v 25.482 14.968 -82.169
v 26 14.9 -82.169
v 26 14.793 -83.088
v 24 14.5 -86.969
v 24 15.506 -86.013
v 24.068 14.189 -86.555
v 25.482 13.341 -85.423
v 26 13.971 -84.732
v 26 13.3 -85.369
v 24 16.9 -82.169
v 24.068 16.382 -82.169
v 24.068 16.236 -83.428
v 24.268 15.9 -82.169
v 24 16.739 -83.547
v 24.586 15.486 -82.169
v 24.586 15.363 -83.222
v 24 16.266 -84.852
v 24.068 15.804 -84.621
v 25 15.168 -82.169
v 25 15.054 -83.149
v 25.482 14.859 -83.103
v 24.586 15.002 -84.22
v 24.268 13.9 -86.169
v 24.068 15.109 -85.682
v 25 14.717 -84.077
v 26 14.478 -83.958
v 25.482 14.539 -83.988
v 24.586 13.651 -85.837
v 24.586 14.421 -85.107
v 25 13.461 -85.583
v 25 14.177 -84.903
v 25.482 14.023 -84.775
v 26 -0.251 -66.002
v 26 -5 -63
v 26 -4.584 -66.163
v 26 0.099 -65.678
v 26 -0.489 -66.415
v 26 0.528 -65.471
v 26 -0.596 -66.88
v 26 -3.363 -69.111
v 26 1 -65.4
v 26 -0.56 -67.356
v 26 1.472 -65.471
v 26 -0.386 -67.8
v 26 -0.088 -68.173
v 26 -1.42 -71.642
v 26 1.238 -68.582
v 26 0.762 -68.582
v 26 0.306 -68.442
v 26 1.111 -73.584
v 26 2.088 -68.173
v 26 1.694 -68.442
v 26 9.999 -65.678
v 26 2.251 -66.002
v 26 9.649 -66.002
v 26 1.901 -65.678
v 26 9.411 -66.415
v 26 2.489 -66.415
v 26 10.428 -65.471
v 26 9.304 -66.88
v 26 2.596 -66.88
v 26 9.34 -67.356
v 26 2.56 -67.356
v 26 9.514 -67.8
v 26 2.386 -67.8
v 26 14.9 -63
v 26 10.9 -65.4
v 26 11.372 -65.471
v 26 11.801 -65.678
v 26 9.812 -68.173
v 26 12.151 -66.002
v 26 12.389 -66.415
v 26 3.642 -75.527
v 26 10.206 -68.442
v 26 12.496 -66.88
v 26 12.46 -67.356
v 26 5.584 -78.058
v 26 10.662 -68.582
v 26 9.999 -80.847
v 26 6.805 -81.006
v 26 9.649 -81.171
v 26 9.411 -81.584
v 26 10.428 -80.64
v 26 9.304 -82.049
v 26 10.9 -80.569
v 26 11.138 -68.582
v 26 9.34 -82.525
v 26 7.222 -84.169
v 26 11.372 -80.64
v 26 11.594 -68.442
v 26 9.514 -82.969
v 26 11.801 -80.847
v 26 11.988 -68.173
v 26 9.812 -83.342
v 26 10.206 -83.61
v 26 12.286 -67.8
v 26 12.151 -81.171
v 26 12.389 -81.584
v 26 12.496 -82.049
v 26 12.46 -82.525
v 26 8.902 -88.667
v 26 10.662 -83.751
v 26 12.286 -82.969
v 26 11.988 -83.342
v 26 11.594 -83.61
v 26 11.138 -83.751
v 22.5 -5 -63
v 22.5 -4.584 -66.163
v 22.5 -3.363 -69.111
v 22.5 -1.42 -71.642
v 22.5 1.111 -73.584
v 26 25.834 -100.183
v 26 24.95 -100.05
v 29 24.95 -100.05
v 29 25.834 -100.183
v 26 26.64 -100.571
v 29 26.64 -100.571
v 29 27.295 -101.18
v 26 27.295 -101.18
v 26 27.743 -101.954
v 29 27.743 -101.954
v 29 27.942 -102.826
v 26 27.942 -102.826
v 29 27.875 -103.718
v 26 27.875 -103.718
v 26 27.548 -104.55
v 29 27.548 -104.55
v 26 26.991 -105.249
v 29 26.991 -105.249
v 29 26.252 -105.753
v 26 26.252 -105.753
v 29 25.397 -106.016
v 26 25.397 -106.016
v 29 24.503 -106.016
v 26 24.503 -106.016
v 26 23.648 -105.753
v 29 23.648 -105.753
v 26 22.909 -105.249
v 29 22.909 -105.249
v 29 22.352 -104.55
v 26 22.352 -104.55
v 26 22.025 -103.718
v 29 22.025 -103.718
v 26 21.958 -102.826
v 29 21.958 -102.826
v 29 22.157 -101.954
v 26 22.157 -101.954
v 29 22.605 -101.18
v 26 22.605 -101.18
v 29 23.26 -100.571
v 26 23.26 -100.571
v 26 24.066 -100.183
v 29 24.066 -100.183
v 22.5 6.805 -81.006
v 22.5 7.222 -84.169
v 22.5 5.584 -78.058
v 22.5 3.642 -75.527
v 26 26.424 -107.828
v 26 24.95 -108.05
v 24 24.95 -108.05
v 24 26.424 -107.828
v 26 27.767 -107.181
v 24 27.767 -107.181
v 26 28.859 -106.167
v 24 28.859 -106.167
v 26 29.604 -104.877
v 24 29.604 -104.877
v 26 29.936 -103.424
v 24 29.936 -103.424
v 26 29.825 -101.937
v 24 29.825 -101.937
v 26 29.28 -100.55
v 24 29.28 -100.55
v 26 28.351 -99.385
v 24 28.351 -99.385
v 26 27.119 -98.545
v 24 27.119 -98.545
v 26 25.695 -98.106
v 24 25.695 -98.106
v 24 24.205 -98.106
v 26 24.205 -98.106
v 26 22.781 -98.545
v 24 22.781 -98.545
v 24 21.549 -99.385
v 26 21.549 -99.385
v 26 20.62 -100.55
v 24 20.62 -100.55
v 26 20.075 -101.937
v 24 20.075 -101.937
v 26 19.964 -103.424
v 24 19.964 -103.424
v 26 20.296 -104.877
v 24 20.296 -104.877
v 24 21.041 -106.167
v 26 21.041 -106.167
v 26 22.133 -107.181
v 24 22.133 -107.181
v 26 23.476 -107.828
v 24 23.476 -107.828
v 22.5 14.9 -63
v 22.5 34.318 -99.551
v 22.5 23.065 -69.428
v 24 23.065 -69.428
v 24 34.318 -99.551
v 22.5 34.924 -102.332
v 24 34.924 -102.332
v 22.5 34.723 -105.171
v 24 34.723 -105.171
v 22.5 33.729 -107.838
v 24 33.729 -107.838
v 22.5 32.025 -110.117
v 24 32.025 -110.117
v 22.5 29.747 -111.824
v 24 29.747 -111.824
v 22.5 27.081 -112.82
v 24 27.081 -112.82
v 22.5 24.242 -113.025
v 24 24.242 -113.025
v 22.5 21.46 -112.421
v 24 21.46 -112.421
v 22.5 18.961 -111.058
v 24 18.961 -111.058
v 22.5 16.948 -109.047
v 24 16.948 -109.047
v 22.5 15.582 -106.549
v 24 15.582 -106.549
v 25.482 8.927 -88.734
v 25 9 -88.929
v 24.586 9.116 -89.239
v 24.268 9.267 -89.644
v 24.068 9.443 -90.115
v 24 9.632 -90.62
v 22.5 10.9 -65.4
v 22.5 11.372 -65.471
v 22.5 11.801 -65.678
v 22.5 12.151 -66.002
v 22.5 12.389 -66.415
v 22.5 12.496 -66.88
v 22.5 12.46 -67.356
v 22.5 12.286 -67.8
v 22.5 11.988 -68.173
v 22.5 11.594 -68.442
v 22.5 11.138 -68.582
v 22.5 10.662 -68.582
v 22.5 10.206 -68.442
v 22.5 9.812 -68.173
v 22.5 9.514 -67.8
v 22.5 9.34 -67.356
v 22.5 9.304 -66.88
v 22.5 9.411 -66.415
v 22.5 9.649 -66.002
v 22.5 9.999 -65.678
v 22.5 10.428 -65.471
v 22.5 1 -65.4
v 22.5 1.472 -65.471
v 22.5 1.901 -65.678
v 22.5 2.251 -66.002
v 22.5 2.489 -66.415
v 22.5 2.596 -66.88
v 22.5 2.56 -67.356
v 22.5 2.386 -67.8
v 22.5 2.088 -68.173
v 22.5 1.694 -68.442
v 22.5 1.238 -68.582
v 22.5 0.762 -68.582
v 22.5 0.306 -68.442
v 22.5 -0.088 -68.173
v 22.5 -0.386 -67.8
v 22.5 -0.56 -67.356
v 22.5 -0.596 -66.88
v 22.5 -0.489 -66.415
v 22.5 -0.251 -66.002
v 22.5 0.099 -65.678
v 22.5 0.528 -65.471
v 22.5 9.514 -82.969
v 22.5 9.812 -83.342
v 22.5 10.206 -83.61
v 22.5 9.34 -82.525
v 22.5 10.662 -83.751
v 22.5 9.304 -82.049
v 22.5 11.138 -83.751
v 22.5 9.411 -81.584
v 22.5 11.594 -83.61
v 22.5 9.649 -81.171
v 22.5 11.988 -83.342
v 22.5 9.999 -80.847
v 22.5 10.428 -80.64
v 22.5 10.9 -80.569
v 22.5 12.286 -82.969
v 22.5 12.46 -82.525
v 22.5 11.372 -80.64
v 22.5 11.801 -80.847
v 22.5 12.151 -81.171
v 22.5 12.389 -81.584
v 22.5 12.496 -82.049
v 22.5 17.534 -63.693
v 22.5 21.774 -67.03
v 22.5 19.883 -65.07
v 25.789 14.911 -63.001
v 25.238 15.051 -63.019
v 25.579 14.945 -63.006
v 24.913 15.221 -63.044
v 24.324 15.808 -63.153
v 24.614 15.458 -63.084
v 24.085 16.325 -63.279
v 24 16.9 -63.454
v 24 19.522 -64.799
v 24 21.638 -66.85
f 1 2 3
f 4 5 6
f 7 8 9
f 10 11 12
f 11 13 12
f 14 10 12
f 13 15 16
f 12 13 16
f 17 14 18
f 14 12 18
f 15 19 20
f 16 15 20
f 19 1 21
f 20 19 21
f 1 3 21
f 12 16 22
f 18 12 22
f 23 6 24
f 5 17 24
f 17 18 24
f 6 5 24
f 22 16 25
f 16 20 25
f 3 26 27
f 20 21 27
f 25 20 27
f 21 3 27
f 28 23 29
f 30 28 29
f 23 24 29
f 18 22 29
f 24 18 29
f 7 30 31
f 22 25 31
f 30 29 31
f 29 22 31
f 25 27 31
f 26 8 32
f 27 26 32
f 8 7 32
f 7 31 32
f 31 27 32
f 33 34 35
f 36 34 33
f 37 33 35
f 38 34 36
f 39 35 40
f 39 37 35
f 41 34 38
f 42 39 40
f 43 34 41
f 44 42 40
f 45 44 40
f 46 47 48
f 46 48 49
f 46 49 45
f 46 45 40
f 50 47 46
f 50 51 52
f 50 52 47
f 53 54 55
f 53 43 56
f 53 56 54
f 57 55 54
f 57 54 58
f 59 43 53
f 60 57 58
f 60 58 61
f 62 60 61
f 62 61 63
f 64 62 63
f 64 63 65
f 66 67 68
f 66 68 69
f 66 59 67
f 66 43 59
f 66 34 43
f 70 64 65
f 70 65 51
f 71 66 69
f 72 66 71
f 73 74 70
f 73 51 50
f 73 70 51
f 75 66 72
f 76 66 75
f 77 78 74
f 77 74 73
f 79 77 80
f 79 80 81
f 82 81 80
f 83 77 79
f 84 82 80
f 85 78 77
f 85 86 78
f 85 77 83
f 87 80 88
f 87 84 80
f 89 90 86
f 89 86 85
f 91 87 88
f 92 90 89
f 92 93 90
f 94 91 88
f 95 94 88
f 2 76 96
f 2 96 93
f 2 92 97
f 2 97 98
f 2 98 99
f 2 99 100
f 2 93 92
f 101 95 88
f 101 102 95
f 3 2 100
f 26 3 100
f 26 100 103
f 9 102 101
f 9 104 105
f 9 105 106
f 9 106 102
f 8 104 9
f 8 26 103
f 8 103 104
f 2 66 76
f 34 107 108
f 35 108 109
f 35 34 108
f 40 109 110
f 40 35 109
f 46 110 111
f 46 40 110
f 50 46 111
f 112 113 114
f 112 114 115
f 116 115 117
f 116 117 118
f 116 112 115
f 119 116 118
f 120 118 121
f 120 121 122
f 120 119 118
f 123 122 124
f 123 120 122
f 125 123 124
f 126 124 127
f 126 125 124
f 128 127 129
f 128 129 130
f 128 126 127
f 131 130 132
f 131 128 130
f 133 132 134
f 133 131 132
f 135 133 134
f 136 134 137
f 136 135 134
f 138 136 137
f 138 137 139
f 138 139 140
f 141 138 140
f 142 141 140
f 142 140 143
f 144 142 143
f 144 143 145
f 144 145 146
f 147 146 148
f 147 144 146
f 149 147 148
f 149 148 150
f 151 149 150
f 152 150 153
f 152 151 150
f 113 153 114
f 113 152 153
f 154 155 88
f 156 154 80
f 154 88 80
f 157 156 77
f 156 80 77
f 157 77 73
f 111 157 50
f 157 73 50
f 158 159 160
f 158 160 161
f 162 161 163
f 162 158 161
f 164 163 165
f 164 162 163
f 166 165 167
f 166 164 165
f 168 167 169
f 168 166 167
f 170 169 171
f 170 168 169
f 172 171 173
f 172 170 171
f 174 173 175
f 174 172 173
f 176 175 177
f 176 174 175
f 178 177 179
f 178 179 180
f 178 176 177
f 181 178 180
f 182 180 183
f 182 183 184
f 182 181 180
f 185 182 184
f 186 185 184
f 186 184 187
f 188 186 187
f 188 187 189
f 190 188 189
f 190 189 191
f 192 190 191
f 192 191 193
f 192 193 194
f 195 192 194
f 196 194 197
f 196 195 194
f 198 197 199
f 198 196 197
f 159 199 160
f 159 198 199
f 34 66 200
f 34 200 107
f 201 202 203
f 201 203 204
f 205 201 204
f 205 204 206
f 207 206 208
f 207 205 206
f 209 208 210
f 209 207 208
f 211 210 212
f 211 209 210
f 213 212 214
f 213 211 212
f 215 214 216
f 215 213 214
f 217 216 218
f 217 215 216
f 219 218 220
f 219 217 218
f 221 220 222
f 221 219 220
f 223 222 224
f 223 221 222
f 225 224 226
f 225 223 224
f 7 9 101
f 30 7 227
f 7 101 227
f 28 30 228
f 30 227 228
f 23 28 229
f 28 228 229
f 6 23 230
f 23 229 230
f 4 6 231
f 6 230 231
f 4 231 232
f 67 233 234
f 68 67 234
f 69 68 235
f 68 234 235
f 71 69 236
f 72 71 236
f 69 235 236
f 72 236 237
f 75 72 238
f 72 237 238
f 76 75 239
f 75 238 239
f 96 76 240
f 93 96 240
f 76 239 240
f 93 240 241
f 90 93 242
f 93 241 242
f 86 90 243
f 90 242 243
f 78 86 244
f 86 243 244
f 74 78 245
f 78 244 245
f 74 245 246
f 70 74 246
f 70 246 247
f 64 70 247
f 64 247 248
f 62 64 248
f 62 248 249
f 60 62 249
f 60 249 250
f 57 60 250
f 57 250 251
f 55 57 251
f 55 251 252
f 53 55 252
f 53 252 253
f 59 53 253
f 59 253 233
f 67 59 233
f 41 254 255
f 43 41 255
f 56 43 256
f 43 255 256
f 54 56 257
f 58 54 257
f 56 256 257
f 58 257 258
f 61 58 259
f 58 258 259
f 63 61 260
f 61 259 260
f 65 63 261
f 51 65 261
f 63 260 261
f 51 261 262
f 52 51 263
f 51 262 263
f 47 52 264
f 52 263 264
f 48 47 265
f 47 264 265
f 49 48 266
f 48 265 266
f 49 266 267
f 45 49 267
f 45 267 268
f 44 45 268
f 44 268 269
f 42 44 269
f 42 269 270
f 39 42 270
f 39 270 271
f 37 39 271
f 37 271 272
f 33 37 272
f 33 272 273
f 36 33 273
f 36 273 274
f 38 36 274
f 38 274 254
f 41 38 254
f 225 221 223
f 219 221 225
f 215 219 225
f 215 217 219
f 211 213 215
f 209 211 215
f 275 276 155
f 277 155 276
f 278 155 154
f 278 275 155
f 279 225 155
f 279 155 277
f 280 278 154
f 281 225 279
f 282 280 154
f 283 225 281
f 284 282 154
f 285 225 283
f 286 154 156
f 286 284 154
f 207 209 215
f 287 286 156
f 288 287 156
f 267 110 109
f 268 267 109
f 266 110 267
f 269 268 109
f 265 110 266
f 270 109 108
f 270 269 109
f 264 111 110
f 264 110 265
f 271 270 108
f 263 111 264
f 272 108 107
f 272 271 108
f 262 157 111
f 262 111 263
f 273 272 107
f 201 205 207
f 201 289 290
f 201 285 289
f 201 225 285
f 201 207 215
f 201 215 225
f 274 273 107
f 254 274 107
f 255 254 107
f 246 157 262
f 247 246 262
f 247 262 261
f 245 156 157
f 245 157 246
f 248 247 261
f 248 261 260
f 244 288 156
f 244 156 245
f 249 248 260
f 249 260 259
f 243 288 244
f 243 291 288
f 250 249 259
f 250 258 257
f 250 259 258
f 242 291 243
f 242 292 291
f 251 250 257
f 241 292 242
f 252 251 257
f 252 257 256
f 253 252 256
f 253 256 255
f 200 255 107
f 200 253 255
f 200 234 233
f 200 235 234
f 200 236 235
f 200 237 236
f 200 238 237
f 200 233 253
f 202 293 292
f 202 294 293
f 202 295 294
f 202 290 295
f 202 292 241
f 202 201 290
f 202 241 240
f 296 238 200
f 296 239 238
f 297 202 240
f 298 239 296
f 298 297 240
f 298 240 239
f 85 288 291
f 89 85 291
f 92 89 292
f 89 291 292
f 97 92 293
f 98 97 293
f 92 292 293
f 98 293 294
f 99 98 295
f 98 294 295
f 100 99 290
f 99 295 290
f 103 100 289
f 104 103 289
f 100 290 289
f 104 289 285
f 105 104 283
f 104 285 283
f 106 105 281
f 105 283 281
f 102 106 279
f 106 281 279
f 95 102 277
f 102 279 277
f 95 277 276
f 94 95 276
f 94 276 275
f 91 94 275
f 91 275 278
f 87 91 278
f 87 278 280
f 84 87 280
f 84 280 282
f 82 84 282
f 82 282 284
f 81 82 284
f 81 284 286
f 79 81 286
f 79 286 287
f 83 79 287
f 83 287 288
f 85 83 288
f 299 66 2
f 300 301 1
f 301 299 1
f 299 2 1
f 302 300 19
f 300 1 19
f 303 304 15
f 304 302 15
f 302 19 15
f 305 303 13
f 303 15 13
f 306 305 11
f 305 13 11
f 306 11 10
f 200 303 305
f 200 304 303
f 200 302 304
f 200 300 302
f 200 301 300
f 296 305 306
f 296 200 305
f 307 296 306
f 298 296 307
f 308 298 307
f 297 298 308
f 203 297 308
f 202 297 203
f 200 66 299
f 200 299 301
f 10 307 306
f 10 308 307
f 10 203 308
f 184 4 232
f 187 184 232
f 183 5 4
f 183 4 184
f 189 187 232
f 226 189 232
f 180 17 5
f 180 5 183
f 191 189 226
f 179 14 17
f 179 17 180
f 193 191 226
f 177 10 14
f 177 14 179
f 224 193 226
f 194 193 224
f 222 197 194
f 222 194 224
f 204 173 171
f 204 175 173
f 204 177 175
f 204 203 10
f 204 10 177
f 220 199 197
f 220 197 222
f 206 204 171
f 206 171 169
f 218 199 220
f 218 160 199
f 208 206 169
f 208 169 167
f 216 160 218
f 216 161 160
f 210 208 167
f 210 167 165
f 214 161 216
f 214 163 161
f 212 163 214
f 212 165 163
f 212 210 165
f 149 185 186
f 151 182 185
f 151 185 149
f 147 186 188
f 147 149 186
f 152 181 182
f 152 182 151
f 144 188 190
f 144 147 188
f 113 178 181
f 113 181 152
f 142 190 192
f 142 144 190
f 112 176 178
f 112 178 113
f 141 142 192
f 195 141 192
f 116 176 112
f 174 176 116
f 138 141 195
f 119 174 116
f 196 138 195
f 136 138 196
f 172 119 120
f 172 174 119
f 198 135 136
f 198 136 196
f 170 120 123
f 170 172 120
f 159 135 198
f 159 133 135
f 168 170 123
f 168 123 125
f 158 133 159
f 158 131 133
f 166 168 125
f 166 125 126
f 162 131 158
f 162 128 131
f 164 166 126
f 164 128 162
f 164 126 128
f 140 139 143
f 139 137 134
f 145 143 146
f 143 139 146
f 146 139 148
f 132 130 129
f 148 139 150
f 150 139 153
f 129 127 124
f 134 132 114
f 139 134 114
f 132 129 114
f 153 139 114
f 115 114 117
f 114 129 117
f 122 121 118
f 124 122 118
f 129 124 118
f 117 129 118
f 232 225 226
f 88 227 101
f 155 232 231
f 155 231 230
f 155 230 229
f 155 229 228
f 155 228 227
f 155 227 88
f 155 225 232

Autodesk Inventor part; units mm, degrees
sketch "スケッチ1" plane through (0, 0, 0) normal (0, 1, 0) x (-1, 0, 0)
  line L0 (11.25, 0) -> (-11.25, 0)
  line L1 (-11.25, 0) -> (-11.25, -120)
  line L2 (-11.25, -120) -> (11.25, -120)
  line L3 (11.25, -120) -> (11.25, 0)
  point P0 (0, 0)
  point P1 (0, 0)
  dimension "d0" = 22.5
  dimension "d3" = 120
extrude "押し出し1" add sketch "スケッチ1" along normal blind 2
sketch "スケッチ2" plane through (0, 0, 0) normal (0, -1, 0) x (1, 0, 0)
  line L0 (19, -120) -> (-19, -120)
  line L1 (-19, -120) -> (-19, -103.05)
  line L2 (-19, -103.05) -> (19, -103.05)
  line L3 (19, -103.05) -> (19, -120)
  line L4 (11.25, -120) -> (-11.25, -120) projected
  point P0 (0, 0)
  point P1 (0, -120)
  dimension "d6" = 38
  dimension "d11" = 16.95
extrude "押し出し2" add sketch "スケッチ2" against normal blind 13.44
sketch "スケッチ4" plane through (11.25, 0, -103.05) normal (0, 0, 1) x (1, 0, 0)
  circle A0 centre (-11.25, 20) radius 20
  line L0 (7.75, 0) -> (0, 0) projected
  line L1 (-22.5, 0) -> (0, 0) projected
  point P0 (-11.25, 0)
  point P1 (-11.25, 0)
  dimension "d12" = 40
extrude "押し出し4" cut sketch "スケッチ4" along normal through all
sketch "スケッチ5" plane through (11.25, 0, -103.05) normal (0, 0, 1) x (1, 0, 0)
  circle A0 centre (-11.25, 20) radius 20
  arc A1 (-11.25, 0) -> (-2.5322, 2) centre (-11.25, 20) ccw projected
  line L0 (-30.25, 13.44) -> (7.75, 13.44)
  line L1 (7.75, 13.44) -> (7.75, -5)
  line L2 (7.75, -5) -> (-30.25, -5)
  line L3 (-30.25, -5) -> (-30.25, 13.44)
  line L4 (7.75, 0) -> (7.75, 13.44) projected
  line L5 (7.75, 0) -> (0, 0) projected
  line L6 (-30.25, 4.22) -> (-11.25, 20)
  line L7 (-11.25, 20) -> (7.75, 4.22)
  point P0 (3.875, 0)
  point P1 (7.6436, 13.44)
  point P2 (-30.1436, 13.44)
  point P3 (7.75, 4.22)
  point P4 (4.1356, 7.2218)
  point P5 (-26.6356, 7.2218)
  point P6 (-3.3514, 13.44)
  point P7 (-19.1486, 13.44)
  dimension "d15" = 5
extrude "押し出し5" add sketch "スケッチ5" along normal up to surface (103.05 mm away) contours A0 L7 L1 L2 L3 L6
sketch "スケッチ24" plane through (11.25, 0, -103.05) normal (0, 0, -1) x (-1, 0, 0)
  line L0 (-7.75, 0) -> (11.25, 0) projected
  line L1 (-7.75, -5) -> (-7.75, 0) projected
  line L2 (30.25, -5) -> (-7.75, -5) projected
  line L3 (30.25, 0) -> (30.25, -5) projected
  line L4 (11.25, 0) -> (30.25, 0) projected
  point P0 (11.25, 0)
extrude "押し出し22" add sketch "スケッチ24" along normal up to surface (16.95 mm away)
sketch "スケッチ25" plane through (19, 13.44, -103.05) normal (1, 0, 0) x (0, 0, -1)
  line L0 (-103.05, -13.44) -> (-103.05, -6.2182) projected
  line L1 (16.95, -18.44) -> (16.95, 0) projected
  line L2 (16.95, -13.44) -> (-40.05, -13.44)
  line L3 (-40.05, -13.44) -> (-40.05, 1.46)
  line L4 (-40.05, 1.46) -> (16.95, 1.46)
  line L5 (16.95, 1.46) -> (16.95, -13.44)
  dimension "d77" = 14.9
  dimension "d78" = 57
extrude "押し出し23" add sketch "スケッチ25" against normal up to surface (38 mm away)
sketch "スケッチ26" plane through (19, -5, 0) normal (1, 0, 0) x (0, 0, -1)
  line L0 (63, 12.2218) -> (0, 12.2218) projected
  circle A0 centre (63, 12.2218) radius 12.2218
  line L1 (0, 0) -> (120, 0) projected
  circle A1 centre (84.1688, 0) radius 12.2218
  line L2 (84.1688, 12.2218) -> (120, 12.2218)
  line L3 (120, 0) -> (120, 19.9) projected
  point P0 (0, 5)
  point P1 (73.5844, 6.1109)
  point P2 (63, 0)
extrude "押し出し24" cut sketch "スケッチ26" against normal through all contours A1 L1 A0 | A1 L1 | L2 L3 L1 A1 picked at (80.2991, 4.512)
sketch "スケッチ28" plane through (19, -5, 0) normal (1, 0, 0) x (0, 0, -1)
  circle A0 centre (103.05, 29.95) radius 18.95
  line L0 (120, 12.2218) -> (120, 19.9) projected
  line L1 (120, 19.9) -> (63, 19.9) projected
  line L2 (84.1688, 12.2218) -> (120, 12.2218) projected
  point P0 (0, 5)
  point P1 (96.3557, 12.2218)
  point P2 (86.9845, 19.9)
  dimension "d83" = 16.95
  dimension "d84" = 10.05
  dimension "d85" = 37.9
extrude "押し出し25" cut sketch "スケッチ28" against normal through all contours L1 A0 L2 | L1 L0 L2 A0
fillet "フィレット4" radius 2 1 edges at (0, 7.2218, -96.3557)
ref_plane "作業平面4" through (22.5, -5, 0) normal (1, 0, 0) x (0, 0, -1)
ref_plane "作業平面5" through (-23.5, -5, 0) normal (-1, 0, 0) x (0, 0, 1)
sketch "スケッチ29" plane through (22.5, -5, 0) normal (1, 0, 0) x (0, 0, -1)
  line L0 (63, 19.9) -> (63, 9.22) projected
  line L1 (86.9845, 19.9) -> (63, 19.9) projected
  arc A0 (84.1688, 12.2218) -> (73.5844, 6.1109) centre (84.1688, 0) ccw projected
  arc A1 (63, 0) -> (73.5844, 6.1109) centre (63, 12.2218) ccw projected
  line L2 (63, 9.22) -> (0, 9.22) projected
  line L3 (63, 9.22) -> (63, -0.3745)
  line L4 (84.1688, 12.2218) -> (84.1688, 19.9)
  point P0 (0, 5)
  point P1 (63, 0)
extrude "押し出し26" add sketch "スケッチ29" against normal up to surface (46 mm away)
fillet "フィレット5" radius 2 4 edges at (19, 11.0609, -84.1688) (19, -0.39, -63) (-19, -0.39, -63) (-19, 11.0609, -84.1688)
ref_plane "作業平面6" through (0, 20, -45) normal (0, 0, 1) x (1, 0, 0)
sketch "スケッチ31" plane through (0, 20, -45) normal (0, 0, 1) x (1, 0, 0)
  circle A0 centre (0, 0) radius 22
  arc A1 (-15.3856, -12.7782) -> (15.3856, -12.7782) centre (0, 0) ccw projected
  point P0 (0, -20)
  dimension "d95" = 44
extrude "押し出し27" cut sketch "スケッチ31" along normal blind 12
sketch "スケッチ32" plane through (22.5, -5, 0) normal (1, 0, 0) x (0, 0, -1)
  line L0 (63, 19.9) -> (63, 0) projected
  arc A0 (63, 0) -> (73.5844, 6.1109) centre (63, 12.2218) ccw projected
  arc A1 (84.1688, 12.2218) -> (73.5844, 6.1109) centre (84.1688, 0) ccw projected
  line L1 (84.1688, 12.2218) -> (84.1688, 19.9) projected
  line L2 (84.1688, 19.9) -> (63, 19.9) projected
  circle A2 centre (103.05, 29.95) radius 4
  circle A3 centre (103.05, 29.95) radius 10
  line L3 (99.5506, 39.3177) -> (106.5494, 20.5823)
  line L4 (106.5494, 20.5823) -> (68.1093, 6.2226)
  line L5 (68.1093, 6.2226) -> (61.1105, 24.9581)
  line L6 (61.1105, 24.9581) -> (99.5506, 39.3177)
  point P0 (0, 5)
  dimension "d98" = 40.05
  dimension "d99" = 10.05
  dimension "d100" = 8
  dimension "d101" = 20
extrude "押し出し28" add sketch "スケッチ32" along normal blind 3.5 contours L5 L4 A1 A0 L0 | L5 L6 A3 L4 L1 L2 | L2 L1 A1 L4 L5 | L3 A2 A3 | A3 L3 A2 | L3 A2 | A2 L3
sketch "スケッチ33" plane through (22.5, -5, 0) normal (-1, 0, 0) x (0, 0, 1)
  line L0 (73.7681, 73.9475) -> (-168.83, 73.9475)
  line L1 (-168.83, 73.9475) -> (-168.83, -57.4645)
  line L2 (-168.83, -57.4645) -> (73.7681, -57.4645)
  line L3 (73.7681, -57.4645) -> (73.7681, 73.9475)
  point P0 (0, 5)
extrude "押し出し29" cut sketch "スケッチ33" along normal through all
sketch "スケッチ34" plane through (22.5, -5, 0) normal (-1, 0, 0) x (0, 0, 1)
  arc A0 (-99.5506, 39.3177) -> (-106.5494, 20.5823) centre (-103.05, 29.95) ccw projected
  circle A1 centre (-103.05, 29.95) radius 3
  point P0 (0, 5)
  dimension "d106" = 6
extrude "押し出し30" add sketch "スケッチ34" against normal blind 6.5
sketch "スケッチ35" plane through (22.5, -5, 0) normal (-1, 0, 0) x (0, 0, 1)
  circle A0 centre (-67, 6) radius 1.6 projected
  circle A1 centre (-67, 15.9) radius 1.6 projected
  circle A2 centre (-82.1688, 15.9) radius 1.6 projected
  point P0 (0, 5)
extrude "押し出し31" cut sketch "スケッチ35" against normal through all
sketch "スケッチ36" plane through (26, -5, 0) normal (1, 0, 0) x (0, 0, -1)
  line L0 (84.1688, 19.9) -> (63, 19.9) projected
  line L1 (84.1688, 12.2218) -> (84.1688, 19.9) projected
  circle A0 centre (82.1688, 15.9) radius 1.35 projected
  circle A1 centre (82.1688, 15.9) radius 4
  line L2 (84.1688, 19.9) -> (88.6672, 13.9022)
  circle A2 centre (67, 6) radius 1.6 projected
  circle A3 centre (67, 15.9) radius 1.6 projected
  circle A4 centre (82.1688, 15.9) radius 1.6 projected
  circle A5 centre (103.05, 29.95) radius 3 projected
  line L3 (99.5506, 39.3177) -> (61.1105, 24.9581) projected
  line L4 (61.1105, 24.9581) -> (63, 19.9) projected
  line L5 (63, 19.9) -> (63, 0) projected
  arc A6 (63, 0) -> (73.5844, 6.1109) centre (63, 12.2218) ccw projected
  arc A7 (84.1688, 12.2218) -> (73.5844, 6.1109) centre (84.1688, 0) ccw projected
  line L6 (84.1688, 12.2218) -> (106.5494, 20.5823) projected
  arc A8 (106.5494, 20.5823) -> (99.5506, 39.3177) centre (103.05, 29.95) ccw projected
  circle A9 centre (103.05, 29.95) radius 5
  circle A10 centre (103.05, 29.95) radius 3 projected
  point P0 (0, 5)
  point P1 (82.1688, 19.9)
  point P2 (85.3688, 18.3)
  dimension "d111" = 10
extrude "押し出し32" cut sketch "スケッチ36" against normal blind 2 contours L1 A1 L0 | L2 A1 L1 | L0 L4 L3 A8 L6 L2
fillet "フィレット6" radius 2 3 edges at (24, 14.4777, -83.9577) (24, 11.1011, -87.018) (24, 14.9, -72.5844)
fillet "フィレット7" radius 10 1 edges at (23.25, 19.9581, -61.1105)
properties part number "fore_arm_side_left"
